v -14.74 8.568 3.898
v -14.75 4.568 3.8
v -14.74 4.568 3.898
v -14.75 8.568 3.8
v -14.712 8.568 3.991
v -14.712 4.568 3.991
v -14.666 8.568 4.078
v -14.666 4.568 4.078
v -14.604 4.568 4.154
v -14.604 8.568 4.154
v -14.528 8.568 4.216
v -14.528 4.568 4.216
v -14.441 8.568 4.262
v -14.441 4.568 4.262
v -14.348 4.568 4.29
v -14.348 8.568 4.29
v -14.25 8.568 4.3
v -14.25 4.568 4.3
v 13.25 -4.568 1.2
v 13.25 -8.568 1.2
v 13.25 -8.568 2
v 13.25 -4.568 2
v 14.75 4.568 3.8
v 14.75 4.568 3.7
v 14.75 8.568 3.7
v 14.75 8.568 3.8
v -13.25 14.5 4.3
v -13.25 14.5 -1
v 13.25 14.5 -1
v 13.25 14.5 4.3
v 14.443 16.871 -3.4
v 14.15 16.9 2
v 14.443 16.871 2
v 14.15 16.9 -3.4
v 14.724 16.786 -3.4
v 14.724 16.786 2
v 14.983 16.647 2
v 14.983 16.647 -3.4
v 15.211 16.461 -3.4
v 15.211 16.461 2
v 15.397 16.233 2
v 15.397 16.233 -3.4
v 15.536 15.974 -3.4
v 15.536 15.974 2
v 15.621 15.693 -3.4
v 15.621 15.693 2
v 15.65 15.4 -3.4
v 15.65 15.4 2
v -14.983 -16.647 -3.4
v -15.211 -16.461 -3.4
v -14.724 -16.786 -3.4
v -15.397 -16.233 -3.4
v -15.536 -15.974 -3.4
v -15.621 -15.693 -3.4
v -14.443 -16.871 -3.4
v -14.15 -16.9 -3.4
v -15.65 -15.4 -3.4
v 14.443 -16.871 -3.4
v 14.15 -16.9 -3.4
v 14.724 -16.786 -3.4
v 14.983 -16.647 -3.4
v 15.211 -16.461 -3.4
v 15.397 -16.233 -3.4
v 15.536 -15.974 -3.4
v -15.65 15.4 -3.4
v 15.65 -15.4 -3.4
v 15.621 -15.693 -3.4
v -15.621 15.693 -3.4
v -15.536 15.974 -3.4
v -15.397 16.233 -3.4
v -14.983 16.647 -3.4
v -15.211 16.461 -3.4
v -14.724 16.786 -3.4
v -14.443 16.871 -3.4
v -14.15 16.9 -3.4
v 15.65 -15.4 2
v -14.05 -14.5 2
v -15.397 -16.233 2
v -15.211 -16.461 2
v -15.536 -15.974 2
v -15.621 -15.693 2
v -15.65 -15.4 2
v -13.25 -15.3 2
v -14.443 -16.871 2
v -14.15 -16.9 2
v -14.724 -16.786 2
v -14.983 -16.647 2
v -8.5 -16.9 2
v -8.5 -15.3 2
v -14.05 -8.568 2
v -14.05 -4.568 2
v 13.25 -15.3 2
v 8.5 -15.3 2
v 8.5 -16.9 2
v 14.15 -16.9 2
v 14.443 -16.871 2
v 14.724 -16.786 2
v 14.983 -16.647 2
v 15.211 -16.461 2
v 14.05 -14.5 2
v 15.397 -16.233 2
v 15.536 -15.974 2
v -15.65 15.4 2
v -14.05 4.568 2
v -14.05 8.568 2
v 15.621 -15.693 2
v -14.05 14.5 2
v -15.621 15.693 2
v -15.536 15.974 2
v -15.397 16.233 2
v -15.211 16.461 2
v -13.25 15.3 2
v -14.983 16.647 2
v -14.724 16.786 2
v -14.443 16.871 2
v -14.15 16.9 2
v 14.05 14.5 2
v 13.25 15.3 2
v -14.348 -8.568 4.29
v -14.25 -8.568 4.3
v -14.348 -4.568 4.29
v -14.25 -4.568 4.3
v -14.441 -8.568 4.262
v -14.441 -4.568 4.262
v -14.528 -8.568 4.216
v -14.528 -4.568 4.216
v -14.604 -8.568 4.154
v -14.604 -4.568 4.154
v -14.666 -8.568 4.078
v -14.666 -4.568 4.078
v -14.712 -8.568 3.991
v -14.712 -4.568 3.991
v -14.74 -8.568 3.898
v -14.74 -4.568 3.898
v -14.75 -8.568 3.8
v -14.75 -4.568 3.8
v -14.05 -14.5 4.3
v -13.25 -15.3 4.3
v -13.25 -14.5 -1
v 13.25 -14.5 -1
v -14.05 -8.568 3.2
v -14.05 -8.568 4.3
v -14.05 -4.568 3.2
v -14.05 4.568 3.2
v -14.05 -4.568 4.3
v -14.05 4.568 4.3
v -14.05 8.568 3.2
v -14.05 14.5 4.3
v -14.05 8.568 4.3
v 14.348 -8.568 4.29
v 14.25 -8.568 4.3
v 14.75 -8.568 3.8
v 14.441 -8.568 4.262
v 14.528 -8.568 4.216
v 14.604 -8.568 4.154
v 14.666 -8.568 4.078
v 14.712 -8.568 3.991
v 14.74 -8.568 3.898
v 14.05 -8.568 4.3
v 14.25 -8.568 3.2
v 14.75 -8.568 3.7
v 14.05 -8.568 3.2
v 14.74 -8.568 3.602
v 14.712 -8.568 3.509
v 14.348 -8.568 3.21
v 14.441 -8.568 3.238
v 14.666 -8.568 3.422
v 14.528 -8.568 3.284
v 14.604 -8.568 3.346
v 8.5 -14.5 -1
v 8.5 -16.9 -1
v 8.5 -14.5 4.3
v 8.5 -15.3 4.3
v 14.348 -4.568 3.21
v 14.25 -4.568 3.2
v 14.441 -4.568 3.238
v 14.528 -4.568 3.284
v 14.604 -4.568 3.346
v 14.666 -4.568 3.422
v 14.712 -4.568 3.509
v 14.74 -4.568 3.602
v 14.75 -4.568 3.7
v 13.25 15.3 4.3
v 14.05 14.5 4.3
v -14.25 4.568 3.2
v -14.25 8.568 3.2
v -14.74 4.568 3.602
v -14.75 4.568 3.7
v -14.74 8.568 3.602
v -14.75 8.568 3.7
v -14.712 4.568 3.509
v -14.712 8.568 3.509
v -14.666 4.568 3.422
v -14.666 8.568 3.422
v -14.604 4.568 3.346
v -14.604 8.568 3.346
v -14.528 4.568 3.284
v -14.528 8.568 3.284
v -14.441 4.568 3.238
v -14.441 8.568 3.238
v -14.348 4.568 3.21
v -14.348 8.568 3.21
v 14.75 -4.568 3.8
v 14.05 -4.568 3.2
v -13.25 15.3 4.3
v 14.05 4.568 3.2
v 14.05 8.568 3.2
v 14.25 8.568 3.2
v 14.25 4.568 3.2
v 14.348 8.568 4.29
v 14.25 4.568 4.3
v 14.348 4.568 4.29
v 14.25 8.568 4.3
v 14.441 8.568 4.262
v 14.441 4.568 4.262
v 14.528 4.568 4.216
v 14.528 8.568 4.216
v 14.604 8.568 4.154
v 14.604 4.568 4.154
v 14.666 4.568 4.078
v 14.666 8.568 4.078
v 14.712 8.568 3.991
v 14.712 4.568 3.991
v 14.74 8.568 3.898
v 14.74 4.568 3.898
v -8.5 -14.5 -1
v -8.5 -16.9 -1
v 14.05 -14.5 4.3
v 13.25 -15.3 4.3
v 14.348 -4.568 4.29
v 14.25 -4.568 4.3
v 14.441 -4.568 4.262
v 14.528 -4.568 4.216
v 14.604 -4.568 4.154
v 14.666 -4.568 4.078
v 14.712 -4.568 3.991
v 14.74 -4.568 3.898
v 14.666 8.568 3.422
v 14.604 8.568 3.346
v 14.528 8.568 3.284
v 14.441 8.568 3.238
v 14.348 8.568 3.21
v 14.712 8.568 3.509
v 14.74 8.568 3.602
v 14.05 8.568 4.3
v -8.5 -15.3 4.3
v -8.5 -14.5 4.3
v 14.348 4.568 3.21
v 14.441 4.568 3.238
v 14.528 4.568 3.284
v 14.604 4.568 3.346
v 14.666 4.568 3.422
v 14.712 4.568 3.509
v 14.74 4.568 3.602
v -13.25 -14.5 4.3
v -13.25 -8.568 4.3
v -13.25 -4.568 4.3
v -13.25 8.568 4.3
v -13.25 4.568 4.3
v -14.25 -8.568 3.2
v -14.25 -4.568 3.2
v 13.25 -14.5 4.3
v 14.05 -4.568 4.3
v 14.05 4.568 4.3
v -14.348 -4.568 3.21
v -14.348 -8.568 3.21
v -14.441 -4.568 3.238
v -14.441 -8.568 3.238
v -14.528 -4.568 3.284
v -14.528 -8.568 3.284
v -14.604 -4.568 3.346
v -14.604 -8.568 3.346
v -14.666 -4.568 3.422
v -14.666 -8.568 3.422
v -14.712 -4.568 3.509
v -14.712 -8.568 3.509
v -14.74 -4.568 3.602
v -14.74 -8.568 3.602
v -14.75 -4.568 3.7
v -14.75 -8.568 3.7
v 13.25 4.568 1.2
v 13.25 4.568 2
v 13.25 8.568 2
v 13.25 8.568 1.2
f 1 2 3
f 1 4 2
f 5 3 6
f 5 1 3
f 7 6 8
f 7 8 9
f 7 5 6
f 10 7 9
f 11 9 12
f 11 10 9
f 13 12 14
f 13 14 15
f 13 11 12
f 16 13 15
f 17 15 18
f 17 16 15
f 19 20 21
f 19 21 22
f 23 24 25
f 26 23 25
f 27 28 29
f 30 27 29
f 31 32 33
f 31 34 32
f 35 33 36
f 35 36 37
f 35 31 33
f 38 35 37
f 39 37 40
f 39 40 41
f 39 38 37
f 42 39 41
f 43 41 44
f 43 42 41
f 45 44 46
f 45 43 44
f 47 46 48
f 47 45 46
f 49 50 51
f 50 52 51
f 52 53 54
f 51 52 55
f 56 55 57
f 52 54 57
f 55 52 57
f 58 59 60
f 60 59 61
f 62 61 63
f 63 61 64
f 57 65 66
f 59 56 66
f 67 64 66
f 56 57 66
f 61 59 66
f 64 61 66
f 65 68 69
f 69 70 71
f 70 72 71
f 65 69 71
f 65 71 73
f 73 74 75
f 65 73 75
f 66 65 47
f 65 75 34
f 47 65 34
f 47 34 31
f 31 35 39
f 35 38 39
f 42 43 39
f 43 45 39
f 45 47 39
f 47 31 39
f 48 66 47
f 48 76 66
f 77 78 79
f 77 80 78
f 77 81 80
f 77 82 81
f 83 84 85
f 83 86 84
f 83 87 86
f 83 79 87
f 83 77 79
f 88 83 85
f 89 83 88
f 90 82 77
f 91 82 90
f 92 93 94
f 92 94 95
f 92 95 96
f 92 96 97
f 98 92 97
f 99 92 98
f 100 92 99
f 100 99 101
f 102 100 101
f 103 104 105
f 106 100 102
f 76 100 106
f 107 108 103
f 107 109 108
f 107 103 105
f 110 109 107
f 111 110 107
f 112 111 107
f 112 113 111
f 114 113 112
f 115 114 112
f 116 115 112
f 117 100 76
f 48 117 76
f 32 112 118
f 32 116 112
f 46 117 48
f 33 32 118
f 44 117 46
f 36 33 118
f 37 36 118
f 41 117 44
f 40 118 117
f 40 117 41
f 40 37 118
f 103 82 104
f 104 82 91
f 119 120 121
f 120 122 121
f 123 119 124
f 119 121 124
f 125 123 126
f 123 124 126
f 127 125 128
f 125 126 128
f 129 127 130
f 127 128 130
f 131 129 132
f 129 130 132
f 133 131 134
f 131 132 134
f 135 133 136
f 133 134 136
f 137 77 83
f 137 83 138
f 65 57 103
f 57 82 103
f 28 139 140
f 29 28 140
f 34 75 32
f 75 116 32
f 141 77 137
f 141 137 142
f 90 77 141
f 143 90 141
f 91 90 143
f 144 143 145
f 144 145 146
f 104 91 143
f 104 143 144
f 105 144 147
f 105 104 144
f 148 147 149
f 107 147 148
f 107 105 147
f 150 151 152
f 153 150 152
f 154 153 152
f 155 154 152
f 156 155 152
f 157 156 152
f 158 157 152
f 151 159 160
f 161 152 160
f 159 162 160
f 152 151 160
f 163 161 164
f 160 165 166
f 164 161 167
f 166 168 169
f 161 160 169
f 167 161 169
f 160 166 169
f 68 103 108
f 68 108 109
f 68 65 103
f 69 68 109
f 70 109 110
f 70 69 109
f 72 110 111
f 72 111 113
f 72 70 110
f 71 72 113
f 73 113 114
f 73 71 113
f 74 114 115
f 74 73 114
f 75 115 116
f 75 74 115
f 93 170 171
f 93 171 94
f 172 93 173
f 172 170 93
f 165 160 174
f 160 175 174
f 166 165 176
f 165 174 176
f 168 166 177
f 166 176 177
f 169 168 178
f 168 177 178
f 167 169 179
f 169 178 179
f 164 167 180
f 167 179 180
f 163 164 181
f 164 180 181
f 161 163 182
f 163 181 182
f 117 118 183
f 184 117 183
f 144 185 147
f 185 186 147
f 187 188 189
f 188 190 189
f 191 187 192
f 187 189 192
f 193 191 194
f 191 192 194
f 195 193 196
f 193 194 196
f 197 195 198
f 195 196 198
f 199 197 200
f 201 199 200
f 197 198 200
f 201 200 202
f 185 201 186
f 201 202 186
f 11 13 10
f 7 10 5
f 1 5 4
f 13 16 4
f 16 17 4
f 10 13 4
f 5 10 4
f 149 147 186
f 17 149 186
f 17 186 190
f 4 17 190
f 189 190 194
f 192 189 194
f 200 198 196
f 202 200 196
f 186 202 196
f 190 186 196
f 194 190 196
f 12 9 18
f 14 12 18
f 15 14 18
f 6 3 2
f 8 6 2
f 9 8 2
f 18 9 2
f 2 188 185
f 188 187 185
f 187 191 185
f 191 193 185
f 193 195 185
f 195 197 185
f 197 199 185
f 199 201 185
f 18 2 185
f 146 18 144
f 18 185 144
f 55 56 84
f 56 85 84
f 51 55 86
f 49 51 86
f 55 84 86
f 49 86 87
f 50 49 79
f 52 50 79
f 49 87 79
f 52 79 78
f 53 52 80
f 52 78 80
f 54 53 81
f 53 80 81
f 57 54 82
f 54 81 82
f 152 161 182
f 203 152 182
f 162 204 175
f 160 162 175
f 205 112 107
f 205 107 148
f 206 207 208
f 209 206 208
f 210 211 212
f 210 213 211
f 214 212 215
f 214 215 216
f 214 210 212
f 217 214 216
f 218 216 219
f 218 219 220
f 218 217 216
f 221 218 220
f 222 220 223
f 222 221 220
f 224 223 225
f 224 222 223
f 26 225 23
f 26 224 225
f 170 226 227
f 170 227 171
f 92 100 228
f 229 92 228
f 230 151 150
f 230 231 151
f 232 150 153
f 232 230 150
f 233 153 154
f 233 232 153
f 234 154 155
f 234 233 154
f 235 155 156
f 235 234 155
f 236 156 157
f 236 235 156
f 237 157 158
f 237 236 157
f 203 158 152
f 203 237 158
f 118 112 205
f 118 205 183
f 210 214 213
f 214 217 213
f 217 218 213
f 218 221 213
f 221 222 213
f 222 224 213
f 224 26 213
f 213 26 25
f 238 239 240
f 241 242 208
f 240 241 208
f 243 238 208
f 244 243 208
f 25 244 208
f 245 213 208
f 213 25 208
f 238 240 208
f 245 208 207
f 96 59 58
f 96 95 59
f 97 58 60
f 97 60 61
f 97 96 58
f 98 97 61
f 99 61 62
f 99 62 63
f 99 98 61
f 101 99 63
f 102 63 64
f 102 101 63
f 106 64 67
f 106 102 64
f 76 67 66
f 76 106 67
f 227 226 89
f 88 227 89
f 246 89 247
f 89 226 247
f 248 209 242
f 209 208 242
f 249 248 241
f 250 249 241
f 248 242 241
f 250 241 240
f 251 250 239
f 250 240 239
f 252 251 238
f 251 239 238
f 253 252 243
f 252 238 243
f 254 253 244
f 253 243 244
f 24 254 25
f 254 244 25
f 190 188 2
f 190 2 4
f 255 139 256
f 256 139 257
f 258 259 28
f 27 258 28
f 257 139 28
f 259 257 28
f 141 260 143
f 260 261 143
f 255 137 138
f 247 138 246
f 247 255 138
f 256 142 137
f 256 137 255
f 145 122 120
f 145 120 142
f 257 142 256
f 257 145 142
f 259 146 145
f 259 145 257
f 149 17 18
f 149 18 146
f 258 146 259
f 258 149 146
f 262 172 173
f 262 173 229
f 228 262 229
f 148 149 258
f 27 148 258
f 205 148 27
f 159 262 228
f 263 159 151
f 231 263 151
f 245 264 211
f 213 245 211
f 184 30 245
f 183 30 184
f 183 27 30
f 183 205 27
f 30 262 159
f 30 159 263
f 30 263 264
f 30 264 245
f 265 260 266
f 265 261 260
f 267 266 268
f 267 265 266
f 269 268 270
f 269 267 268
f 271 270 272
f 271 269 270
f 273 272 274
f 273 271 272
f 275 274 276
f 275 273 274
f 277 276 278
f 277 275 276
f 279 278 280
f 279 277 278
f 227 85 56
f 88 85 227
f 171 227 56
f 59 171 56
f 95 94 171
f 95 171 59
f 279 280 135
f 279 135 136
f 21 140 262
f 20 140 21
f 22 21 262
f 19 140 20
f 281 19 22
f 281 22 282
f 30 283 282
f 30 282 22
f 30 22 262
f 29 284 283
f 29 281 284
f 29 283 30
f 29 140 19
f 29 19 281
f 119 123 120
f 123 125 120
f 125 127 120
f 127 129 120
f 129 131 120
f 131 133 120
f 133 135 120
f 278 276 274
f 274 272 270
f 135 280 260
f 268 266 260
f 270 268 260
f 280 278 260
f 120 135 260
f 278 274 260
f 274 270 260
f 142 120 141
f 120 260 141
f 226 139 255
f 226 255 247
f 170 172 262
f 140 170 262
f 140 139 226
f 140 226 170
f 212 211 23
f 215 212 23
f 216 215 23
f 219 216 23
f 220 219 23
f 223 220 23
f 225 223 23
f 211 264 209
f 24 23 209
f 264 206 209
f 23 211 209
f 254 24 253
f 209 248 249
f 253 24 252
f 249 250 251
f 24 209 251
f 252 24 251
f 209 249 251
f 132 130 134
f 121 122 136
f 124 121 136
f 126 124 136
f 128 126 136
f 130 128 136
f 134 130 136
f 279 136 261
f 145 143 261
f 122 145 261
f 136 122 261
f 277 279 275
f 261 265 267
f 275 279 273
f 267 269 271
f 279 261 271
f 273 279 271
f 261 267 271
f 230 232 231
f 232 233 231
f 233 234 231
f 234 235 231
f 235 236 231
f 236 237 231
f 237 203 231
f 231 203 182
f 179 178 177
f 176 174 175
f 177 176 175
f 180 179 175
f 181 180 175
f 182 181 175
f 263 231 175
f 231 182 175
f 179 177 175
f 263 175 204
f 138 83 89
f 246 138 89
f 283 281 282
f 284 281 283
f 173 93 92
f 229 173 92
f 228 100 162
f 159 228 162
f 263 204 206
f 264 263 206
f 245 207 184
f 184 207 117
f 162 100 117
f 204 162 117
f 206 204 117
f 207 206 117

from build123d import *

# Parameters (mm, degrees)
F1_START      = -1
F0_W          = 16
F0_H          = 2.4
F0_W_2        = 2.4
F0_H_2        = 16
F1_DEPTH      = 2.4
F0_W_3        = 31.3
F0_H_3        = 33.8
F2_DEPTH      = 2
F2_DEPTH_BACK = 3.4
F4_W          = 28.1
F4_H          = 30.6
F4_W_2        = 26.5
F4_H_2        = 29
F5_DEPTH      = 2.3
F6_START      = 1.2
F3_W          = 0.8
F3_H          = 4
F3_W_2        = 0.2
F3_W_3        = 0.5
F6_DEPTH      = 0.8
F7_START      = 2
F7_DEPTH      = 2.3
F8_START      = 3.2
F8_DEPTH      = 1.1
F9_R          = 0.5
F11_START     = 14
F10_W         = 17
F10_H         = 7
F11_DEPTH     = 4
F12_R         = 1.5
F14_SIZE      = 0.8


# Not quite as in the source:
# - a feature names something its author has since deleted; it is built from what else it names


with BuildPart() as f1:
    # F0 (on Top) → F1 (new body)
    with BuildSketch(Plane.XY.offset(F1_START)):
        Polygon((-8, 14.5), (-13.25, 14.5), (-13.25, 8), (-10.85, 8), (-10.85, -8), (-13.25, -8), (-13.25, -14.5), (-8, -14.5), (-8, -12.1), (8, -12.1), (8, -14.5), (13.25, -14.5), (13.25, -8), (10.85, -8), (10.85, 8), (13.25, 8), (13.25, 14.5), (8, 14.5), (8, 12.1), (-8, 12.1), align=None)
        with Locations((0, -13.3)):
            Rectangle(F0_W, F0_H)
        with Locations((-12.05, 0)):
            Rectangle(F0_W_2, F0_H_2)
        with Locations((12.05, 0)):
            Rectangle(F0_W_2, F0_H_2)
        with Locations((0, 13.3)):
            Rectangle(F0_W, F0_H)
    extrude(amount=-F1_DEPTH)

    # F0 (on Top) → F2 (join, two sides)
    with BuildSketch(Plane.XY) as f2_sk:
        Rectangle(F0_W_3, F0_H_3)
        Polygon((-13.25, 8), (-13.25, 14.5), (-8, 14.5), (8, 14.5), (13.25, 14.5), (13.25, 8), (13.25, -8), (13.25, -14.5), (8, -14.5), (-8, -14.5), (-13.25, -14.5), (-13.25, -8), align=None, mode=Mode.SUBTRACT)
    extrude(amount=F2_DEPTH)
    extrude(f2_sk.sketch, amount=-F2_DEPTH_BACK)

    # F4 (on face) → F5 (join)
    with BuildSketch(Plane.XY.offset(2)):
        Rectangle(F4_W, F4_H)
        Rectangle(F4_W_2, F4_H_2, mode=Mode.SUBTRACT)
    extrude(amount=F5_DEPTH)

    # F3 (on Top) → F6 (join)
    with BuildSketch(Plane.XY.offset(F6_START)):
        with Locations((-13.6500000894, 6.5681297779)):
            Rectangle(F3_W, F3_H)
        with Locations((-14.1500000894, 6.5681297779)):
            Rectangle(F3_W_2, F3_H)
        with Locations((-14.5000000894, 6.5681297779)):
            Rectangle(F3_W_3, F3_H)
        with Locations((13.6499995038, 6.5681299639)):
            Rectangle(F3_W, F3_H)
        with Locations((14.1499995038, 6.5681299639)):
            Rectangle(F3_W_2, F3_H)
        with Locations((14.4999995038, 6.5681299639)):
            Rectangle(F3_W_3, F3_H)
        with Locations((-14.1500000894, -6.5681295022)):
            Rectangle(F3_W_2, F3_H)
        with Locations((-14.5000000894, -6.5681295022)):
            Rectangle(F3_W_3, F3_H)
        with Locations((-13.6500000894, -6.5681295022)):
            Rectangle(F3_W, F3_H)
        with Locations((14.1499995038, -6.5681295022)):
            Rectangle(F3_W_2, F3_H)
        with Locations((14.4999995038, -6.5681295022)):
            Rectangle(F3_W_3, F3_H)
        with Locations((13.6499995038, -6.5681295022)):
            Rectangle(F3_W, F3_H)
    extrude(amount=F6_DEPTH)

    # F3 (on Top) → F7 (join)
    with BuildSketch(Plane.XY.offset(F7_START)):
        with Locations((-13.6500000894, -6.5681295022)):
            Rectangle(F3_W, F3_H)
        with Locations((-13.6500000894, 6.5681297779)):
            Rectangle(F3_W, F3_H)
        with Locations((13.6499995038, -6.5681295022)):
            Rectangle(F3_W, F3_H)
        with Locations((13.6499995038, 6.5681299639)):
            Rectangle(F3_W, F3_H)
    extrude(amount=F7_DEPTH)

    # F3 (on Top) → F8 (join)
    with BuildSketch(Plane.XY.offset(F8_START)):
        with Locations((-14.5000000894, 6.5681297779)):
            Rectangle(F3_W_3, F3_H)
        with Locations((-14.1500000894, 6.5681297779)):
            Rectangle(F3_W_2, F3_H)
        with Locations((-14.5000000894, -6.5681295022)):
            Rectangle(F3_W_3, F3_H)
        with Locations((-14.1500000894, -6.5681295022)):
            Rectangle(F3_W_2, F3_H)
        with Locations((14.4999995038, 6.5681299639)):
            Rectangle(F3_W_3, F3_H)
        with Locations((14.1499995038, 6.5681299639)):
            Rectangle(F3_W_2, F3_H)
        with Locations((14.4999995038, -6.5681295022)):
            Rectangle(F3_W_3, F3_H)
        with Locations((14.1499995038, -6.5681295022)):
            Rectangle(F3_W_2, F3_H)
    extrude(amount=F8_DEPTH)

    # F9
    f9_edges = [f1.edges().sort_by_distance(p)[0] for p in [
        (13.25, 6.56813, 1.2),
        (14.75, 6.56813, 3.2),
        (-14.75, 6.56813, 3.2),
        (-14.75, 6.56813, 4.3),
        (14.75, -6.56813, 4.3),
        (14.75, -6.56813, 3.2),
        (13.25, -6.56813, 1.2),
        (-14.75, -6.56813, 4.3),
        (-14.75, -6.56813, 3.2),
        (14.75, 6.56813, 4.3),
    ]]
    fillet(f9_edges, radius=F9_R)

    # F10 (on Front) → F11 (cut)
    with BuildSketch(Plane.XZ.offset(F11_START)):
        with Locations((-4.619e-07, 2.5000009835)):
            Rectangle(F10_W, F10_H)
    extrude(amount=F11_DEPTH, mode=Mode.SUBTRACT)

    # F12
    f12_edges = [f1.edges().sort_by_distance(p)[0] for p in [
        (15.65, -16.9, -0.7),
        (15.65, 16.9, -0.7),
        (-15.65, 16.9, -0.7),
        (-15.65, -16.9, -0.7),
    ]]
    fillet(f12_edges, radius=F12_R)

    # F14
    f14_edges = [f1.edges().sort_by_distance(p)[0] for p in [
        (-14.05, 15.3, 3.15),
        (14.05, 15.3, 3.15),
        (-14.05, -15.3, 3.15),
        (14.05, -15.3, 3.15),
    ]]
    chamfer(f14_edges, length=F14_SIZE)


solid = f1.part
